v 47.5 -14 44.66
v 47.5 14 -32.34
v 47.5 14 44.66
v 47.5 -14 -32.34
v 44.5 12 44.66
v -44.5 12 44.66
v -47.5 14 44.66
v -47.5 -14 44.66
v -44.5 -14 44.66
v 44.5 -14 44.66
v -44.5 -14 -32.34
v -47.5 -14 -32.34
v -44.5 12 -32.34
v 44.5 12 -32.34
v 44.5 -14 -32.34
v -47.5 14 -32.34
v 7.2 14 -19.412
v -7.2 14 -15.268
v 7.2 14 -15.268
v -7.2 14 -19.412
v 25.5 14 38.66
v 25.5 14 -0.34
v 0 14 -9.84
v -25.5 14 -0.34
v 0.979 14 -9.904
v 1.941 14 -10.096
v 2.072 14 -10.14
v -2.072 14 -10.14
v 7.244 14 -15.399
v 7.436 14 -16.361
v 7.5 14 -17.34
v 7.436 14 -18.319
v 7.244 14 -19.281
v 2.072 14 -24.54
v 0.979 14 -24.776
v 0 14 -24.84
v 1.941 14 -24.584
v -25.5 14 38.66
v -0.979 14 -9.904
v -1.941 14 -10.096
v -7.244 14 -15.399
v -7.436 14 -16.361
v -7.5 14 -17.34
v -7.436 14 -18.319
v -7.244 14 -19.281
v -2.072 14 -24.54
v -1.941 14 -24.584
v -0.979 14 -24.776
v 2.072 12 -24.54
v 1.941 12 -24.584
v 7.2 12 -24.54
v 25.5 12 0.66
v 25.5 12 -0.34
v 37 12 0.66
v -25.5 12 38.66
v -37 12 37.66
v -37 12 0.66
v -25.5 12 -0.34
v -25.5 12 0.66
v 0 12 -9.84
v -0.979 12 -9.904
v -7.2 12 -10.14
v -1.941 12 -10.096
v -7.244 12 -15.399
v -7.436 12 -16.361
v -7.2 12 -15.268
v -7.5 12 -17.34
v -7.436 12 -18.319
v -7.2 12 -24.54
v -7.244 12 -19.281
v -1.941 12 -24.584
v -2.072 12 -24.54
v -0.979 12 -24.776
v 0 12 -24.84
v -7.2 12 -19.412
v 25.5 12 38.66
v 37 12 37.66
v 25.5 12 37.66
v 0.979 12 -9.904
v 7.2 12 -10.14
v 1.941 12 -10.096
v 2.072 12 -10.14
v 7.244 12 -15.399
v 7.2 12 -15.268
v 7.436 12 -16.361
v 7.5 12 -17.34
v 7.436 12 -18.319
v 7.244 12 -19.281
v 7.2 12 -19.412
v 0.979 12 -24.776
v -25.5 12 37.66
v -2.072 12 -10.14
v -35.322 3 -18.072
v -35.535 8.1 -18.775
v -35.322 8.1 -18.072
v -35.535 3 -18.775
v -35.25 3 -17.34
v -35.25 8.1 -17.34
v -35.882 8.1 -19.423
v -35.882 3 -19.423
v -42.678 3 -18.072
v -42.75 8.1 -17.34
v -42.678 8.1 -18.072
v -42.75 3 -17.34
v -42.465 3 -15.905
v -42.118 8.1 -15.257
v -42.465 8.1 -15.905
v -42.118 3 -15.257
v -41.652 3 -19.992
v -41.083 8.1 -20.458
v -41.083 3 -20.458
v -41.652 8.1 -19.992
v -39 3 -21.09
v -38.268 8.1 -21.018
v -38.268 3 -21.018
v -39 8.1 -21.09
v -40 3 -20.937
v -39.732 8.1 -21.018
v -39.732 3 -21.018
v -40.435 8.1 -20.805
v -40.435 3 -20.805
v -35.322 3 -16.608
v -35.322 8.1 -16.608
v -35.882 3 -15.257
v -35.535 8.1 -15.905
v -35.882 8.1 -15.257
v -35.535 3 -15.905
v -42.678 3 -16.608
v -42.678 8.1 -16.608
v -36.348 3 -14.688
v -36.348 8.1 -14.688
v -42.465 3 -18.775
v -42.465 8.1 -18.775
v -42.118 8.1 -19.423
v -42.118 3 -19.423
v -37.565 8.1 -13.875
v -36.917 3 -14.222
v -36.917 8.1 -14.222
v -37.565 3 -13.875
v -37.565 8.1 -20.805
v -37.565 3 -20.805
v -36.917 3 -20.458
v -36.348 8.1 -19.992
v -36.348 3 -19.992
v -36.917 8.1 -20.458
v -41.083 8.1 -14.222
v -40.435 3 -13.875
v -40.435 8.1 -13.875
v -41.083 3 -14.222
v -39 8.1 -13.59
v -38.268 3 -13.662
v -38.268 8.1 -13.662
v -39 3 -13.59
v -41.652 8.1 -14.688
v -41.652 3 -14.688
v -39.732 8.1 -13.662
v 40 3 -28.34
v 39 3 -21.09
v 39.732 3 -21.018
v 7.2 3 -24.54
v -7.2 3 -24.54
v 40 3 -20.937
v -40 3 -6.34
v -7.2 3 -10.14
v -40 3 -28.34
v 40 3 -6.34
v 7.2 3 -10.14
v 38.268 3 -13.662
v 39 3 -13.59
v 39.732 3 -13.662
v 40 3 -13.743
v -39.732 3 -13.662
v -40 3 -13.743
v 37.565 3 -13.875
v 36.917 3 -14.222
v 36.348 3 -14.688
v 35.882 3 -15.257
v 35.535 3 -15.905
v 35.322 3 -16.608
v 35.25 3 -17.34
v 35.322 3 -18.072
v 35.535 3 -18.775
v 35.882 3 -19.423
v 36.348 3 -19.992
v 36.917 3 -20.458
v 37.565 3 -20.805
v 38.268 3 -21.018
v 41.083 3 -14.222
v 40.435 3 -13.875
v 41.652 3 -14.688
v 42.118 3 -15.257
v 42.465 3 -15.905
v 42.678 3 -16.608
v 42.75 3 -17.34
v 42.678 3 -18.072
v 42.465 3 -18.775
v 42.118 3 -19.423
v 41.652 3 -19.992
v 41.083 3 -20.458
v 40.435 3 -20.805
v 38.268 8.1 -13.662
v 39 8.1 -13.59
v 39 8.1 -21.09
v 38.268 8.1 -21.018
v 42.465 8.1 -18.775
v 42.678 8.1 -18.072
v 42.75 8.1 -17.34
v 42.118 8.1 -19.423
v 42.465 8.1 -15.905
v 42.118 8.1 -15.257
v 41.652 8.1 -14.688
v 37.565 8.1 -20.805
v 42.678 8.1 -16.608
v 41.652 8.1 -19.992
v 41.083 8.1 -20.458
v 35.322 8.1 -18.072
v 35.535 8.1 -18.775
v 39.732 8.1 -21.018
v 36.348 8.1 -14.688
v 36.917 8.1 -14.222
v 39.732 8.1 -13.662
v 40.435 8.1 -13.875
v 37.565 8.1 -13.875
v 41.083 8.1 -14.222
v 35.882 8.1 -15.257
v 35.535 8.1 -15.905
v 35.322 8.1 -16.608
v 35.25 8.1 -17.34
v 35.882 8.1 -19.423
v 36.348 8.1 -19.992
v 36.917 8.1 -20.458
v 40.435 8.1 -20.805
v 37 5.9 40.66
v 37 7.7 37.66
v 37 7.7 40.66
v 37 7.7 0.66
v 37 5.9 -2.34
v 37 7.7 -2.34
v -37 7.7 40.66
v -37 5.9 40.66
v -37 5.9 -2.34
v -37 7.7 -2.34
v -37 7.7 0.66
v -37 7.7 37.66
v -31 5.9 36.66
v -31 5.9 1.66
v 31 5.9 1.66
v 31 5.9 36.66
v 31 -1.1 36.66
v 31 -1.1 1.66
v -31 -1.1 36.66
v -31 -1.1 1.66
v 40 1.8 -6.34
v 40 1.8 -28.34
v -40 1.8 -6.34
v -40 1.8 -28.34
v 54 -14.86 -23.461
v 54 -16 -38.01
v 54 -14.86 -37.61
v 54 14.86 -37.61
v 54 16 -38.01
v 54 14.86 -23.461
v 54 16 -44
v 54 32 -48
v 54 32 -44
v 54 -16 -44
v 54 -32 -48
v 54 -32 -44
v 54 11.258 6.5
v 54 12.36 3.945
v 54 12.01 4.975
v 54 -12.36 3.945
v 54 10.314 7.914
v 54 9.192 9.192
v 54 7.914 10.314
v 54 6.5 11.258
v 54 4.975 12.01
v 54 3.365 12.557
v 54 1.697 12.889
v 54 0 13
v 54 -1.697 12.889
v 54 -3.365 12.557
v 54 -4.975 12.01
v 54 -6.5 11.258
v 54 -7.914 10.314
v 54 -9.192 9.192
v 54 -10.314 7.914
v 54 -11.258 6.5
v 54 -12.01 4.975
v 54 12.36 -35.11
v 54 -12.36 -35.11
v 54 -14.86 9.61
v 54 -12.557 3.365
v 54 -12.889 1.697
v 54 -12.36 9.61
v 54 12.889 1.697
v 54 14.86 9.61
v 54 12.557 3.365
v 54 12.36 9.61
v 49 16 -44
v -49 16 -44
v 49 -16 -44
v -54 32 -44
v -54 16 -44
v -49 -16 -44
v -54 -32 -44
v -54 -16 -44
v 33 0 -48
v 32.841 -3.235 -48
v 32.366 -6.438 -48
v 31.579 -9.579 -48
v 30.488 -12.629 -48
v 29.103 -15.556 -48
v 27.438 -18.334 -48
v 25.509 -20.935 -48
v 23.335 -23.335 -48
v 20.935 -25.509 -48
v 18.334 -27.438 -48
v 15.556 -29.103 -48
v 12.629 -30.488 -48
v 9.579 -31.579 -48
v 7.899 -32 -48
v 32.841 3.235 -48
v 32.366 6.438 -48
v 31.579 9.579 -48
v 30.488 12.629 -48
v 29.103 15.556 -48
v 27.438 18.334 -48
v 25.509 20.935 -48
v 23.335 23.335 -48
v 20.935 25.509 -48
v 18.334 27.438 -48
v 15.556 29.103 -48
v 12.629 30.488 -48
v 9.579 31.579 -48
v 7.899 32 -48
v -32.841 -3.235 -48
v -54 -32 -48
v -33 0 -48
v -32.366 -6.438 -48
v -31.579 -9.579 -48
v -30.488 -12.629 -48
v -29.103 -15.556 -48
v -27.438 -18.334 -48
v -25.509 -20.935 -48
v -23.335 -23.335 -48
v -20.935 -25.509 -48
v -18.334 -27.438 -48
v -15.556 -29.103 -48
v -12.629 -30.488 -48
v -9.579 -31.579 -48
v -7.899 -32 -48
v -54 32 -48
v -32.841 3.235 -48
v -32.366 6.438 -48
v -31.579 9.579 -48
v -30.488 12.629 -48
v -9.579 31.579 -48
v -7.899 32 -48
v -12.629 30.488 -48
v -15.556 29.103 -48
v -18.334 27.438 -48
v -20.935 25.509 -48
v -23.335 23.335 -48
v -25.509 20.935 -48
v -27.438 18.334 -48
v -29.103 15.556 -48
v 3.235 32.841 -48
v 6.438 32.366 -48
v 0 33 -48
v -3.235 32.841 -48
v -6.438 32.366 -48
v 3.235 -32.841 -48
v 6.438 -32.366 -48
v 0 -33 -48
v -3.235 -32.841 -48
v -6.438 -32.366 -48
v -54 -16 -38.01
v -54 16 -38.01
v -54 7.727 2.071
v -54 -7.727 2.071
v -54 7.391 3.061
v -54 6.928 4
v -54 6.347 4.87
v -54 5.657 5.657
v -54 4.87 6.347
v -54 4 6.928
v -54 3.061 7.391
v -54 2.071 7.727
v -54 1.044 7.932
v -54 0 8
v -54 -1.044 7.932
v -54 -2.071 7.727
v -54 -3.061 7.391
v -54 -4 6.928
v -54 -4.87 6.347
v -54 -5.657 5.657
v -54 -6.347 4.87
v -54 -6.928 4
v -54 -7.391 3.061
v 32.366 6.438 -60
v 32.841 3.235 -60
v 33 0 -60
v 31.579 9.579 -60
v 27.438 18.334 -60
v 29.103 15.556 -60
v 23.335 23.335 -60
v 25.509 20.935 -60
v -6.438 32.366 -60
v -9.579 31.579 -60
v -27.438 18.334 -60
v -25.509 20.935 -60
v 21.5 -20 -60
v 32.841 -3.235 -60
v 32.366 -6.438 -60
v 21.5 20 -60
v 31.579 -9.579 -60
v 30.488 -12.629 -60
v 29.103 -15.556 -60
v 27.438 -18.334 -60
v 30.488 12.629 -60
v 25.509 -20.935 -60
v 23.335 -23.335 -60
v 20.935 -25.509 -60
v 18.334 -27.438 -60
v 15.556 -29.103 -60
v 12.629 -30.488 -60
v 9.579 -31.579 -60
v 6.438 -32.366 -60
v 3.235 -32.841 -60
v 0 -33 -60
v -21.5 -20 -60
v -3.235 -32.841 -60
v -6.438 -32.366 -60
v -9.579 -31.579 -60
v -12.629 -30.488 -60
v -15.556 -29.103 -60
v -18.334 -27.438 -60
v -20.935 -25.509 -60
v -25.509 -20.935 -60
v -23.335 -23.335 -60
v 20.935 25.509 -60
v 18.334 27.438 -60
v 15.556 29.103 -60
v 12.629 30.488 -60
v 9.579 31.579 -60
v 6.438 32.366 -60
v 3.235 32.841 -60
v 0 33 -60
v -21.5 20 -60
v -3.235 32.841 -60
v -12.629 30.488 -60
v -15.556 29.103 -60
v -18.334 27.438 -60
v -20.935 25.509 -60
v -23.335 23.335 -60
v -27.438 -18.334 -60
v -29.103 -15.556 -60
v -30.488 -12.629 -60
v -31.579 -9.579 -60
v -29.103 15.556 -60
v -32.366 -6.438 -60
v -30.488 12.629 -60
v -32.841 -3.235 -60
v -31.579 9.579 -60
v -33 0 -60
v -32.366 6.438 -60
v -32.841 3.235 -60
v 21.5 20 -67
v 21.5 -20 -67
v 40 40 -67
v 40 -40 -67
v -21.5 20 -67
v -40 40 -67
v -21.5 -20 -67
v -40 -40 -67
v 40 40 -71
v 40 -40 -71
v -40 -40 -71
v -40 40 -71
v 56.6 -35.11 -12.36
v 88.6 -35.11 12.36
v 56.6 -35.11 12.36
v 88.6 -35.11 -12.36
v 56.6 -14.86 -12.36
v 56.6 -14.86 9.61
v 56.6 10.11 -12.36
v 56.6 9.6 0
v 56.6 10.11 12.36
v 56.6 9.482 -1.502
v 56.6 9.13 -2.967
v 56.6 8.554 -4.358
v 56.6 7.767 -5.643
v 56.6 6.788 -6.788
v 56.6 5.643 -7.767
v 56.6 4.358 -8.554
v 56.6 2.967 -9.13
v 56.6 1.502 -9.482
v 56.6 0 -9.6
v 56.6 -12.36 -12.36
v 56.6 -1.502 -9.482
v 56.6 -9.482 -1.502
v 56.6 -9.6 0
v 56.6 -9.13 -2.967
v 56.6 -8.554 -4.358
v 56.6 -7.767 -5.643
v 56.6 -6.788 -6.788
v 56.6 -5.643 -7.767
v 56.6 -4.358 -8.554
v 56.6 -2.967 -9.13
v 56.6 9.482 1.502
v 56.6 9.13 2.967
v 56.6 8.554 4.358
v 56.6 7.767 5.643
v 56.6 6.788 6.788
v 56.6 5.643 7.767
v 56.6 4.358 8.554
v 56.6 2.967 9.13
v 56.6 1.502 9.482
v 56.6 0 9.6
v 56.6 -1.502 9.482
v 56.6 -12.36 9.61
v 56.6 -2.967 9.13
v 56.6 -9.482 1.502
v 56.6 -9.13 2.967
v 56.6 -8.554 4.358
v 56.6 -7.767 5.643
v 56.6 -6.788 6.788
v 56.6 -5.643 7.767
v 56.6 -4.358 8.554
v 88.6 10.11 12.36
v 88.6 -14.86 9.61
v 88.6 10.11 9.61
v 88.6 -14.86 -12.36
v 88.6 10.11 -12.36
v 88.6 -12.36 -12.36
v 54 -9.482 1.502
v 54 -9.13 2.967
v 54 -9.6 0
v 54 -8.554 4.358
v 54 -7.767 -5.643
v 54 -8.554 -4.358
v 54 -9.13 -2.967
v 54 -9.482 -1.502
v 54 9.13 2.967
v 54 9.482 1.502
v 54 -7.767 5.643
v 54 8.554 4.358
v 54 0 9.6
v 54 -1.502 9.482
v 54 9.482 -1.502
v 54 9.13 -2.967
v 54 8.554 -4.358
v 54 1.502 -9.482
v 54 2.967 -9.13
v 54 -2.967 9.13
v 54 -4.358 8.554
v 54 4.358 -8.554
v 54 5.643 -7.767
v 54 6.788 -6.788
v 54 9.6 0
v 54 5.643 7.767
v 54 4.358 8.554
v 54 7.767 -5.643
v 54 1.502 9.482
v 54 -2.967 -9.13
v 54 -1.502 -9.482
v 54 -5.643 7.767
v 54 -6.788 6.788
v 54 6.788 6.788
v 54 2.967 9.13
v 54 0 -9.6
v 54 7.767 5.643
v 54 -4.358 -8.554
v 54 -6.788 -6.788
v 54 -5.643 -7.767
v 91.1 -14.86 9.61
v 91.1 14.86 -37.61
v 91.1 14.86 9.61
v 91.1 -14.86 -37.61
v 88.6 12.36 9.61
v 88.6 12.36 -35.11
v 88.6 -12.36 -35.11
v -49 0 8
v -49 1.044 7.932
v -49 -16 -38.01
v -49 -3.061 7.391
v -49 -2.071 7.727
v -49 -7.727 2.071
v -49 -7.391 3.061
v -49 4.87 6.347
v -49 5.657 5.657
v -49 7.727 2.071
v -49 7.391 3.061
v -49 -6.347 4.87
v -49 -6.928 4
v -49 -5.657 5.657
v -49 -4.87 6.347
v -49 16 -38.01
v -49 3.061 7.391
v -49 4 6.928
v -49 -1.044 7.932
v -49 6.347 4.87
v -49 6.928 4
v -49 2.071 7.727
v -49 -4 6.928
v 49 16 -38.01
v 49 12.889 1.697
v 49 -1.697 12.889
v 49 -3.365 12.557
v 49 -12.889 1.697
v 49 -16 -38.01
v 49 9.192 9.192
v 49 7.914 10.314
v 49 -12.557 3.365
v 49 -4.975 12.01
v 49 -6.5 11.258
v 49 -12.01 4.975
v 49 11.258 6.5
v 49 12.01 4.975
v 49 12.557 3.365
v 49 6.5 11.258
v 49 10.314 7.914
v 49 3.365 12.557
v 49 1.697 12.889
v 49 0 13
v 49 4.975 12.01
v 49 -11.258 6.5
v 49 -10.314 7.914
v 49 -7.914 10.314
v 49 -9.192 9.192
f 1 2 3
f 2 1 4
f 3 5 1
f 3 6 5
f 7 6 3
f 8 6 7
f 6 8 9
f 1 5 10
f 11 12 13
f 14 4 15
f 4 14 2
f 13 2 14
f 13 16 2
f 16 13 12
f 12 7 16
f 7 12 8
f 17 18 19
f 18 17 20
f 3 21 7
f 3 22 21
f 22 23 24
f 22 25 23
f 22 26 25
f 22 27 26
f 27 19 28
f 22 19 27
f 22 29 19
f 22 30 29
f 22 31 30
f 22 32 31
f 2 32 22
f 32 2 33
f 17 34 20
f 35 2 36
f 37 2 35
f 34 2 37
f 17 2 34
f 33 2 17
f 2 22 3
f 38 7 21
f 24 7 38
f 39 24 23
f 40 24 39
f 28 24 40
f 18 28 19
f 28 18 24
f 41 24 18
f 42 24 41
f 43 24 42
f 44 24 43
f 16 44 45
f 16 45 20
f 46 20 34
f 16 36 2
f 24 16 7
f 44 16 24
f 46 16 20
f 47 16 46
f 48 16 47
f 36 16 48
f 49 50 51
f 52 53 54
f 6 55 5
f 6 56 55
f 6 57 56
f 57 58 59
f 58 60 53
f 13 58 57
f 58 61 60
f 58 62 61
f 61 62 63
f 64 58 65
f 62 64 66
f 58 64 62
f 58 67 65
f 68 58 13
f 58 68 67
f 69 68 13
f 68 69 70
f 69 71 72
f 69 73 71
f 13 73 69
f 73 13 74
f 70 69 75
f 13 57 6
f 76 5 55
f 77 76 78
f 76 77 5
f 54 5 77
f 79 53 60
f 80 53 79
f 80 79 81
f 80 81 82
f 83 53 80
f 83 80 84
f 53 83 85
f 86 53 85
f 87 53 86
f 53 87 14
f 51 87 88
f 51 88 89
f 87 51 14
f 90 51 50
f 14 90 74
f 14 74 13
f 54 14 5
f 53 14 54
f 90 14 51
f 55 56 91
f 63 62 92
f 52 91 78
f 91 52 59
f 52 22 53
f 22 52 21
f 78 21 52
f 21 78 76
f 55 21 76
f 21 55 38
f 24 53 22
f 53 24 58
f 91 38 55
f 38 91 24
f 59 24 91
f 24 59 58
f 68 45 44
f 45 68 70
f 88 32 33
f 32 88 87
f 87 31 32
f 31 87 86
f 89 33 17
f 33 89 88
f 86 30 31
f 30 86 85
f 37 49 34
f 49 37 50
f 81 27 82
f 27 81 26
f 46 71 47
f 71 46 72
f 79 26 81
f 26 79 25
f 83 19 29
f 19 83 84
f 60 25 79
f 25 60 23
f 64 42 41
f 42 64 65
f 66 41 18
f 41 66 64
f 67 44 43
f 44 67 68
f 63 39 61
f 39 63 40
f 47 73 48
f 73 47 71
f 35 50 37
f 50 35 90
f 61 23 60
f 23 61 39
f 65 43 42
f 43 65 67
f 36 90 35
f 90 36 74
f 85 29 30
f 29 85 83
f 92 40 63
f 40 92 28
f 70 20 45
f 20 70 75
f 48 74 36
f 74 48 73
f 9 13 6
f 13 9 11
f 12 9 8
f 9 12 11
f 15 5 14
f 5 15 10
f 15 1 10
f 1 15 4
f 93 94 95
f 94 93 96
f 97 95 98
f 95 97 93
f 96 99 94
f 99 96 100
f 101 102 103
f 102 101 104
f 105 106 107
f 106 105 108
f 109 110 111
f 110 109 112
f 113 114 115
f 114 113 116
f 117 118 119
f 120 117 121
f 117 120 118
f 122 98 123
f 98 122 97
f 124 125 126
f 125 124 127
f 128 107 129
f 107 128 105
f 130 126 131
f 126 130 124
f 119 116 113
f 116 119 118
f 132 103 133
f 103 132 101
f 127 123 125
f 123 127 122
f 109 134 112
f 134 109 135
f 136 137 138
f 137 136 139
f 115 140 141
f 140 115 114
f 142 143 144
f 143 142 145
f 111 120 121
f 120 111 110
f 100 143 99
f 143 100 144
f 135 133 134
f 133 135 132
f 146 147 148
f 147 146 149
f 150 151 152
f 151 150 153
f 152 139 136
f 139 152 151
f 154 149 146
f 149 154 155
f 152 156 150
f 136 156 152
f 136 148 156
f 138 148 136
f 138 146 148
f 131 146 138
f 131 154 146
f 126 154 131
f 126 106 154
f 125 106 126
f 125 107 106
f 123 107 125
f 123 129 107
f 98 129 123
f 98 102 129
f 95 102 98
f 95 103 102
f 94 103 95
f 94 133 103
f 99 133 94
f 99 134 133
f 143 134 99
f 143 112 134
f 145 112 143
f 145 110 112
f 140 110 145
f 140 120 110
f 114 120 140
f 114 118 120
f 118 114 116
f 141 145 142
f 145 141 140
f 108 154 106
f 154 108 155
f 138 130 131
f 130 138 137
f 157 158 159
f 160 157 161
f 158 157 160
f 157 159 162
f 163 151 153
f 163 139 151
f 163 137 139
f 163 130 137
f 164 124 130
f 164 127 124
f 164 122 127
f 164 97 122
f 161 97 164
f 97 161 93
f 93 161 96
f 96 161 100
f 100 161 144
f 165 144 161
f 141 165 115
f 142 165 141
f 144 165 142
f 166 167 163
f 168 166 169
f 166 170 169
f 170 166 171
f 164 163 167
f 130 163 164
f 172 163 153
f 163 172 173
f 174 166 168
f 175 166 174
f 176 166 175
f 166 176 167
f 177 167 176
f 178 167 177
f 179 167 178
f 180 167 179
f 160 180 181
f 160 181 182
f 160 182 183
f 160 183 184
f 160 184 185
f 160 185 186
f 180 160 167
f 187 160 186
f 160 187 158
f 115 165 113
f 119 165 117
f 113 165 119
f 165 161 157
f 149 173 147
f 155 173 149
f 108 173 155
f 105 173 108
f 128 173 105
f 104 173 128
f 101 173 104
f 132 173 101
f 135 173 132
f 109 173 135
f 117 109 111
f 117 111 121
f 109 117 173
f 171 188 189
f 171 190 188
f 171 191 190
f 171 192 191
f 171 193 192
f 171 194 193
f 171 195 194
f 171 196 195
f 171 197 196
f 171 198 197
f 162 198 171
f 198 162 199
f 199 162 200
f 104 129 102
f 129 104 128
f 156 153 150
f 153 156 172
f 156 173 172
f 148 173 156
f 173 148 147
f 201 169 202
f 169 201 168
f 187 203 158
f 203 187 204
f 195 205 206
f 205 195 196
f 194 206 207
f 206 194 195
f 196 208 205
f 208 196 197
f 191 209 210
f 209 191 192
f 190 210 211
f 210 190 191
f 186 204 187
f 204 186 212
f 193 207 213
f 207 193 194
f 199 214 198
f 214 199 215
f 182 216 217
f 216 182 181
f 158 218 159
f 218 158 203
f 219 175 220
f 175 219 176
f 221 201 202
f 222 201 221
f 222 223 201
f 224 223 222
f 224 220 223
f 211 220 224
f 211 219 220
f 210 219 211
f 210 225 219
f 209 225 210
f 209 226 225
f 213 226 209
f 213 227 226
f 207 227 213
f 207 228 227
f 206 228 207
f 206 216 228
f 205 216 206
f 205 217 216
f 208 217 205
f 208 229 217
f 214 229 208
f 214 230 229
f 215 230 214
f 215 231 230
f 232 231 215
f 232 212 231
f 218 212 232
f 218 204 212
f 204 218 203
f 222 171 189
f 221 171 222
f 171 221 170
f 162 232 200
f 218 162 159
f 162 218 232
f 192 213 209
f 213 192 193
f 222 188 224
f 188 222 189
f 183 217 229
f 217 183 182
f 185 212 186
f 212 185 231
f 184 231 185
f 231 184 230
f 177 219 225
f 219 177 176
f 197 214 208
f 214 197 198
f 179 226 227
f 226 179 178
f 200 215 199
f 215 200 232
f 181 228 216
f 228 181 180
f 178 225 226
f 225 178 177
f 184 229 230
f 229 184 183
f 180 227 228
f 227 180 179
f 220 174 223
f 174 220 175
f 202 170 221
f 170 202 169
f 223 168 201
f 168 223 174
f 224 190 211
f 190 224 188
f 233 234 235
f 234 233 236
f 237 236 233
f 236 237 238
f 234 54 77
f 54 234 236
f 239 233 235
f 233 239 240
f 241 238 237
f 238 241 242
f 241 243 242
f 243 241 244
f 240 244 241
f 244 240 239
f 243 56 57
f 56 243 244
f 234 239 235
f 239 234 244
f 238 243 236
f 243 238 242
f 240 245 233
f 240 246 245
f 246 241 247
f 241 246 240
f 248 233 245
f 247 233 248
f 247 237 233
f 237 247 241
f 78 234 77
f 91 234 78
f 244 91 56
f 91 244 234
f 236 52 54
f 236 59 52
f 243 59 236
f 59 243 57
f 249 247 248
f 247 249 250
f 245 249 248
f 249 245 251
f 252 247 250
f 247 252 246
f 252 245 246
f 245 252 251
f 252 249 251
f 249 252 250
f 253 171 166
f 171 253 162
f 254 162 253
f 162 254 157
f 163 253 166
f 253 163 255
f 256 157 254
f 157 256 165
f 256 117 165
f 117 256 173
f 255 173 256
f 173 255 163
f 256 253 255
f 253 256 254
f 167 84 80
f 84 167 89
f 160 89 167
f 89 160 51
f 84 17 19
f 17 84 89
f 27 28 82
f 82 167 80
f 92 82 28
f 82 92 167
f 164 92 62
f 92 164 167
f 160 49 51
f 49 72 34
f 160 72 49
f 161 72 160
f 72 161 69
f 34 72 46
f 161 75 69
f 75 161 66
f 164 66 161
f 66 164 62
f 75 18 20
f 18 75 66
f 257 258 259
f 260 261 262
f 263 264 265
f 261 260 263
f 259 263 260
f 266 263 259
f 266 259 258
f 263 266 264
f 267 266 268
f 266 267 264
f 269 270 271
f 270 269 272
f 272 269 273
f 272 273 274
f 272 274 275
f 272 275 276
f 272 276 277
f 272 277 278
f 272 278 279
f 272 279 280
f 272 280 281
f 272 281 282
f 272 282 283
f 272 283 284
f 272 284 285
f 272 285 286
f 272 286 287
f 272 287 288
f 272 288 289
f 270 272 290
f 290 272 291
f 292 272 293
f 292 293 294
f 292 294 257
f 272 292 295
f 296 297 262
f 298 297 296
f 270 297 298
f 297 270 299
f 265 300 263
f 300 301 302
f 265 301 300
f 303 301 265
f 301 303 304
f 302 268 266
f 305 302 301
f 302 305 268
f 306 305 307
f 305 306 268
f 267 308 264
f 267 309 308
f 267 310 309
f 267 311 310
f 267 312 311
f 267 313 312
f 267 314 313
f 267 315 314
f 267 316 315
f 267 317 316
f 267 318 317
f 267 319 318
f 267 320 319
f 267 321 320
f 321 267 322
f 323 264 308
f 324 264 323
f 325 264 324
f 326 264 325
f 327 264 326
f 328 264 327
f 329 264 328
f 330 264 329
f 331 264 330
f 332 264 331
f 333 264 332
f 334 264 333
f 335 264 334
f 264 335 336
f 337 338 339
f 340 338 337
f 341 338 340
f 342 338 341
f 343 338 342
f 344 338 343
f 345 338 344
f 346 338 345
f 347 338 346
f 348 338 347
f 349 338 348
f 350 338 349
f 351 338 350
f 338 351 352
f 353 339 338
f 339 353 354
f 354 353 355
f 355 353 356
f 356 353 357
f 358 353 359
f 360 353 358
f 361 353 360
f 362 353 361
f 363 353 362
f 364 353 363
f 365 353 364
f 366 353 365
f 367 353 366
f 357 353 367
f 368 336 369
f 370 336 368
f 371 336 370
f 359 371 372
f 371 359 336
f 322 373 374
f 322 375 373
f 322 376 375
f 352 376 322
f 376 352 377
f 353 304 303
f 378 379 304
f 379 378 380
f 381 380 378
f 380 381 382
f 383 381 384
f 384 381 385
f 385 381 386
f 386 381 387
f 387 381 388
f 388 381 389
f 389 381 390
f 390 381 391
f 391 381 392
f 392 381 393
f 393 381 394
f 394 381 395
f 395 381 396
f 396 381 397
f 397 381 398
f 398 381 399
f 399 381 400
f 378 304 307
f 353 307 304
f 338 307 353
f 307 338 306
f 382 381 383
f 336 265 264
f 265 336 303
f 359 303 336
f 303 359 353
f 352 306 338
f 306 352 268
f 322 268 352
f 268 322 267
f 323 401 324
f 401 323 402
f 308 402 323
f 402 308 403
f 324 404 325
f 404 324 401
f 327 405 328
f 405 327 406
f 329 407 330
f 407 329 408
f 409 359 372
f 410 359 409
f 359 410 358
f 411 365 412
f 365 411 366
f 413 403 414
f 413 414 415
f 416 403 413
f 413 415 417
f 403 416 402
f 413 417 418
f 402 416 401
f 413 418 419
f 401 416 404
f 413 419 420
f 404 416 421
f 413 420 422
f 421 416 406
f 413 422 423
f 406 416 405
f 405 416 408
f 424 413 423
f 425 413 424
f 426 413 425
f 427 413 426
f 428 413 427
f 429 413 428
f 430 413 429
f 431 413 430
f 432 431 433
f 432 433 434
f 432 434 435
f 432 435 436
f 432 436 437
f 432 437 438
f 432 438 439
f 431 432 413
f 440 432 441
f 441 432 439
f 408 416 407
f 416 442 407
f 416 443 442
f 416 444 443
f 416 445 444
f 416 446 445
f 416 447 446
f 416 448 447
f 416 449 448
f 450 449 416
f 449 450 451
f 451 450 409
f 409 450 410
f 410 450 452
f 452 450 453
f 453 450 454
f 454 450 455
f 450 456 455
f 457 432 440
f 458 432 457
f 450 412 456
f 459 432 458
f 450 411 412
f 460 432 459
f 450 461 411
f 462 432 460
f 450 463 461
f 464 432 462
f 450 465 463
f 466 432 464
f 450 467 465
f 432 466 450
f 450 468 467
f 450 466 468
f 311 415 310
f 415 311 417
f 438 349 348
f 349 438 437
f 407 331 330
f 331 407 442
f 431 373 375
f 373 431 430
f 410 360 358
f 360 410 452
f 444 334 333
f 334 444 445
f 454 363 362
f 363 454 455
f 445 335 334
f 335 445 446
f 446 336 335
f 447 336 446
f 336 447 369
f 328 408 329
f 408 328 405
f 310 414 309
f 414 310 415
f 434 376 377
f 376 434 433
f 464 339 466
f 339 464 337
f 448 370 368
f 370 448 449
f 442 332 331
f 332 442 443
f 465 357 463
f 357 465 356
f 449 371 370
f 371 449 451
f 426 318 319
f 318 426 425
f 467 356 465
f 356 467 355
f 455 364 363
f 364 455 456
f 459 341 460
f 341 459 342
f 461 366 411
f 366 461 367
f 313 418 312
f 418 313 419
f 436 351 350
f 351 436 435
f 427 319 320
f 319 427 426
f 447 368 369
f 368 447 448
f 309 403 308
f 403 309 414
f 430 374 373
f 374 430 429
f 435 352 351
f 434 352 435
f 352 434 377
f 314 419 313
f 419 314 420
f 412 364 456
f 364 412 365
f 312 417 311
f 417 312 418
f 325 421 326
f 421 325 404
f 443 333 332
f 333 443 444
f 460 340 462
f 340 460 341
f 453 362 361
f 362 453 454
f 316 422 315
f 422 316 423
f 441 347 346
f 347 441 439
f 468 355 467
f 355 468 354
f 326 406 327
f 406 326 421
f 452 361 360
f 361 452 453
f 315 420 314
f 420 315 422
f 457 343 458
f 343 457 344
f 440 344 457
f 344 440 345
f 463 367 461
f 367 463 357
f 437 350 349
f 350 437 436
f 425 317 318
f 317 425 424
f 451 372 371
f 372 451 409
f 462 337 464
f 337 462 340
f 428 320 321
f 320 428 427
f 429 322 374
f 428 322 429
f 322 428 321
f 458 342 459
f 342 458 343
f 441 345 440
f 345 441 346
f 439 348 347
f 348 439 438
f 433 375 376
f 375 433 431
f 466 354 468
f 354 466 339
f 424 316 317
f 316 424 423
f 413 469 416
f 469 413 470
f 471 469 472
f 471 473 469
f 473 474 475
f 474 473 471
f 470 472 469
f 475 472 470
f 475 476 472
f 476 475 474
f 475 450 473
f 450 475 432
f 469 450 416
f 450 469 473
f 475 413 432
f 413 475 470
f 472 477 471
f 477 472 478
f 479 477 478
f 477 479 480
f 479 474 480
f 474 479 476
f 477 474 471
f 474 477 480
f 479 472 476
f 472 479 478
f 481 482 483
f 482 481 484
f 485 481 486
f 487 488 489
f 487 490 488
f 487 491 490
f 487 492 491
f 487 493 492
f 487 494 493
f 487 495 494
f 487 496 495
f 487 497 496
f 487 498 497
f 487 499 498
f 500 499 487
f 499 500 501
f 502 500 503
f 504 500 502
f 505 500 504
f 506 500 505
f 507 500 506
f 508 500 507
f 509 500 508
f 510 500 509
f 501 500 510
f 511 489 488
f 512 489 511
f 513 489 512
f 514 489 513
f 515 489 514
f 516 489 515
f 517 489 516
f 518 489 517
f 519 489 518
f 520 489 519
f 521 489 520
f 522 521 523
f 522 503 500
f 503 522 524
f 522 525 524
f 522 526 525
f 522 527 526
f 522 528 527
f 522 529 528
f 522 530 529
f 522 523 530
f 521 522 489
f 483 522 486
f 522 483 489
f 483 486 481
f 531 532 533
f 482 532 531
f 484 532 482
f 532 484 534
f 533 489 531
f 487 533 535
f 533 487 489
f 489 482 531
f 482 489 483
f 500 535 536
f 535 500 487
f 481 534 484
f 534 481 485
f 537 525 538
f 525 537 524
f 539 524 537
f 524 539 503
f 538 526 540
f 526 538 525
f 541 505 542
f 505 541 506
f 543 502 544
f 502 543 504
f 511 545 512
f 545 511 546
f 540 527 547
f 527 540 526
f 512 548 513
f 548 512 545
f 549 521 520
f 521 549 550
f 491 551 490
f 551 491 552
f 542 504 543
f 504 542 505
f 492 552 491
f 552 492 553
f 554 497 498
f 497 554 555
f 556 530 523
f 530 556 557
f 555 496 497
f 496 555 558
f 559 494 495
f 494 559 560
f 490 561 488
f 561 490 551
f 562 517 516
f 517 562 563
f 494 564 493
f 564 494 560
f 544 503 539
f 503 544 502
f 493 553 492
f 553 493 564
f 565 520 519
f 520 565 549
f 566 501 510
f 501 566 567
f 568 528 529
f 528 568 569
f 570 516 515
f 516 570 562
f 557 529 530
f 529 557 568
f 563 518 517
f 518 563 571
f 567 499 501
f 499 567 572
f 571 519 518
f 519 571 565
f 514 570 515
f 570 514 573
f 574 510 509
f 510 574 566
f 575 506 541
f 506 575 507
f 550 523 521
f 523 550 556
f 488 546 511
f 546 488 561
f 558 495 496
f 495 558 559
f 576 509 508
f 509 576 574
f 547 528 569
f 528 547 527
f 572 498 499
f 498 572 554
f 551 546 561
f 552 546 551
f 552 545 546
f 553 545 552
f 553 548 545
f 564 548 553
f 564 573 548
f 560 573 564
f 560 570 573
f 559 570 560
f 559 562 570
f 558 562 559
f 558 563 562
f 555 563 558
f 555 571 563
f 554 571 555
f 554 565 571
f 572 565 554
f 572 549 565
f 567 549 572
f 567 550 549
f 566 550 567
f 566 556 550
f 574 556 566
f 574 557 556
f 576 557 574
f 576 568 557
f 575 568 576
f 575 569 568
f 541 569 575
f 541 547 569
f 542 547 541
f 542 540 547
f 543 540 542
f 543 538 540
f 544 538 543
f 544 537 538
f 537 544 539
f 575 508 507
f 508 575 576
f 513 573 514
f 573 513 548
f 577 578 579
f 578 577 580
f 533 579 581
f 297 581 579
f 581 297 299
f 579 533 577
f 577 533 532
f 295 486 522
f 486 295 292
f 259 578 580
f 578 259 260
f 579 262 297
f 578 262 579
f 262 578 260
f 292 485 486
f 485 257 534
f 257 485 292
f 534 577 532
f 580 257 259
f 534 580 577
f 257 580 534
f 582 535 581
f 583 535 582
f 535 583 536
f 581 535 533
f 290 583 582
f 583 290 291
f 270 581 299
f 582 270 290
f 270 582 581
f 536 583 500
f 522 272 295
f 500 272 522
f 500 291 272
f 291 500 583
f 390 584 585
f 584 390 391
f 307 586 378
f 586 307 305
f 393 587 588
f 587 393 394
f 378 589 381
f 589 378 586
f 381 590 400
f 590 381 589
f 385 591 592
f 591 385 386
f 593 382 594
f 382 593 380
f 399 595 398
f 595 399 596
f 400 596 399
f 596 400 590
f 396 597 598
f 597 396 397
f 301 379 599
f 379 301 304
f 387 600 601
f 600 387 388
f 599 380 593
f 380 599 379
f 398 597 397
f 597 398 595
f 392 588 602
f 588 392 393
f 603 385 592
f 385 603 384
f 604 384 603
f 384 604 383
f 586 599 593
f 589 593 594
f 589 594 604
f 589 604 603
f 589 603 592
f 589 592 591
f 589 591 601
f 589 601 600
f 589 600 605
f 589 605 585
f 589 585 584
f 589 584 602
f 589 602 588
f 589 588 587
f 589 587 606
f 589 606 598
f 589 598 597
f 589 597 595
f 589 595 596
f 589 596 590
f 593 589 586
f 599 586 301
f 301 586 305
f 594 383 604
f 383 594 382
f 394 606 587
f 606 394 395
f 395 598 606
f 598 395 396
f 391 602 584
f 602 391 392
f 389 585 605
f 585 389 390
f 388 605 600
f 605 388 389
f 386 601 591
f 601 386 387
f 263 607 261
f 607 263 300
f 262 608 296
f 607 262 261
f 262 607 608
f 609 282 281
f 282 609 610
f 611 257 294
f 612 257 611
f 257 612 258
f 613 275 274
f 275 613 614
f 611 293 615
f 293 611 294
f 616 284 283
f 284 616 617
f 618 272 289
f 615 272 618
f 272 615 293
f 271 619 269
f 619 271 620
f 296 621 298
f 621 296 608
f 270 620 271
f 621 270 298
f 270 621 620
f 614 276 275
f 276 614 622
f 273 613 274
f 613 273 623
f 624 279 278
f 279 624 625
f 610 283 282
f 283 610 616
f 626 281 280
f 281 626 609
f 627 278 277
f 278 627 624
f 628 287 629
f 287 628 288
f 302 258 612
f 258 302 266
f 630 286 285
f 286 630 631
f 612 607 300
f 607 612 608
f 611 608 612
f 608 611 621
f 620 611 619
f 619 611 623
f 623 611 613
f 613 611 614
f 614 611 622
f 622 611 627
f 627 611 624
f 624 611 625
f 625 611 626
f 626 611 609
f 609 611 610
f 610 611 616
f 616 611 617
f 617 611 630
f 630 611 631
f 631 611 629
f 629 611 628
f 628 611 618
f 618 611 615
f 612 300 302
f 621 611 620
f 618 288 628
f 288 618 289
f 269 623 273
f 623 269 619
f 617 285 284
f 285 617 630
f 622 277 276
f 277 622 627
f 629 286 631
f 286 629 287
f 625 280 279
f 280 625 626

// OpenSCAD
// file: cyd_head_concept.scad
// Concept: the real head = a Guition ESP32-2432S024 (2.4" CYD) for the eyes + the bare C920 board below
// it, in a compact open frame on a yoke - the tilt axle through the head's middle so it's balanced.
// Proportions only (blocks), to agree the layout before the real parts.
//
// Frame: tilt axle along X at the origin, +Y forward, +Z up. tilt = head angle (deg, + = up).
include <../params.scad>

tilt = 0;

// ---- CYD ESP32-2432S024 (MEASURED 2026-10-21; landscape, USB-C at one end) -----------------------------
cyd_b     = [74, 43, 1.8];        // board: long (X), short (Z), thickness
cyd_holes = [68, 36];             // 4 x 3 mm holes, centres
cyd_glass = 4.3;                  // board front -> glass front
cyd_back  = 7;                    // EST: tallest back parts (JST, USB-C, ESP32 module) - TO MEASURE
cyd_act   = [49, 37];             // 2.4" 320x240 active area (nominal)
// ---- C920 bare board (MEASURED) -------------------------------------------------------------------------
cam_b     = [80, 22, 1.2];
cam_lens  = [14.4, 11];           // lens block side, height above the board
cam_mic   = [7.5, 5.1];

face_t    = 2;                    // front plate
gap       = 4;                    // between the screen's board and the camera board
margin    = 4;
head_w    = max(cyd_b[0], cam_b[0] + 7) + 2 * margin;            // mics overhang the camera board ~3.5
head_h    = cyd_b[1] + gap + cam_b[1] + 2 * margin;
y_face    = 14;                   // front face of the plate (forward of the axle)
z_bot     = -head_h * 0.42;       // axle about 42 % up from the bottom (the screen is the heavier part)

z_cam     = z_bot + margin;                         // camera board bottom
z_cyd     = z_cam + cam_b[1] + gap;                 // screen board bottom
y_cyd     = y_face - face_t - cyd_glass;            // screen board front (glass flush behind the plate)
y_cam     = y_face - cam_lens[1];                   // camera board front (lens ~flush with the face)

cheek_gap = 1.5;                  // washer
cheek_t   = 5;

module head() {
    // front plate with the two windows
    color("#d9d9d9") difference() {
        translate([-head_w / 2, y_face - face_t, z_bot]) cube([head_w, face_t, head_h]);
        translate([-cyd_act[0] / 2 - 1, y_face - 3, z_cyd + cyd_b[1] / 2 - cyd_act[1] / 2 - 1]) cube([cyd_act[0] + 2, 4, cyd_act[1] + 2]);
        translate([0, y_face - 3, z_cam + cam_b[1] / 2]) rotate([-90, 0, 0]) cylinder(d = 15, h = 4, $fn = 48);
    }
    // side frames (where the axle goes)
    color("#d9d9d9") for (s = [-1, 1]) translate([s > 0 ? head_w / 2 - 3 : -head_w / 2, -14, z_bot]) cube([3, y_face - face_t + 14, head_h]);
    // the screen
    color("#c98d1a") translate([-cyd_b[0] / 2, y_cyd - cyd_b[2], z_cyd]) cube([cyd_b[0], cyd_b[2], cyd_b[1]]);
    color("#111") translate([-cyd_b[0] / 2, y_cyd, z_cyd + 3]) cube([cyd_b[0], cyd_glass, cyd_b[1] - 6]);
    color("#777") translate([-cyd_b[0] / 2 + 6, y_cyd - cyd_b[2] - cyd_back, z_cyd + 4]) cube([cyd_b[0] - 12, cyd_back, cyd_b[1] - 8]);
    // the camera
    color("#2e7d32") translate([-cam_b[0] / 2, y_cam - cam_b[2], z_cam]) cube([cam_b[0], cam_b[2], cam_b[1]]);
    color("#111") translate([-cam_lens[0] / 2, y_cam, z_cam + cam_b[1] / 2 - cam_lens[0] / 2]) cube([cam_lens[0], cam_lens[1], cam_lens[0]]);
    color("#999") for (s = [-1, 1]) translate([s * (cam_b[0] / 2 - 1), y_cam, z_cam + cam_b[1] / 2]) rotate([-90, 0, 0])
        cylinder(d = cam_mic[0], h = cam_mic[1], $fn = 32);
}

module yoke() {   // the cheeks only, to show the width; the turret below is the test stand's, redrawn later
    color("#555") for (s = [-1, 1]) {
        x0 = s > 0 ? head_w / 2 + cheek_gap : -head_w / 2 - cheek_gap - cheek_t;
        hull() {
            translate([x0, 0, 0]) rotate([0, 90, 0]) cylinder(d = 16, h = cheek_t, $fn = 48);
            translate([x0, -12, -70]) cube([cheek_t, 24, 6]);
        }
    }
    color("#e8a33d") for (s = [-1, 1]) translate([s * (head_w / 2 - 4), 0, 0]) rotate([0, 90, 0]) cylinder(d = 4, h = 12, center = true, $fn = 16);
}

rotate([tilt, 0, 0]) head();
yoke();
echo(str("head ", head_w, " W x ", head_h, " H; yoke outside ", head_w + 2 * (cheek_gap + cheek_t), "; lens ",
         z_cam + cam_b[1] / 2, " / screen centre ", z_cyd + cyd_b[1] / 2, " from the axle"));
// main file
// Rough look at the two tilt drives for the CYD head (blocks, not parts):
//   opt = "A"  direct drive: the tilt servo stands on the outside of the right cheek, its horn on the head
//   opt = "B"  linkage: the tilt servo lies low in the turret; a link runs up behind the head to a crank
// Frame: tilt axle along X at the origin, +Y forward, +Z up. tilt = head angle (deg, + = up).
use <cyd_head_concept.scad>
include <../params.scad>

opt  = "A";
tilt = 0;

head_w = 95;  head_h = 77;  z_hbot = -32.3;      // from cyd_head_concept.scad
gap  = 1.5;   cht = 5;                           // cheek gap + thickness
xc   = head_w / 2 + gap;                         // cheeks' inner faces
srv  = sts_body;                                 // 45.22 x 24.72 x 32

z_floor = opt == "A" ? -44 : -64;                // turret floor top
floor_t = 4;

module servo_blk() {                             // shaft along +Z at the origin, body below, length along +X
    color("#1d3557") translate([-sts_shaft_x, -srv[1] / 2, -srv[2]]) cube(srv);
    color("#c0c0c0") cylinder(d = sts_horn_d, h = sts_horn_h, $fn = 40);
}

module turret_floor() {
    color("#555") translate([-(xc + cht), -32, z_floor - floor_t]) cube([2 * (xc + cht), 64, floor_t]);
    color("#e8a33d") translate([0, 0, z_floor - floor_t - 12]) cylinder(d = 66, h = 12, $fn = 64);    // hub flange
    color("#b0b6bd") translate([-21.5, -20, z_floor - floor_t - 12 - 7]) cube([43, 40, 7]);          // pillow block
    color("#9aa3ad") translate([-40, -40, z_floor - floor_t - 12 - 7 - 4]) cube([80, 80, 4]);        // base plate
}

module cheek(s, top_d = 16) {
    x0 = s > 0 ? xc : -xc - cht;
    color("#555") hull() {
        translate([x0, 0, 0]) rotate([0, 90, 0]) cylinder(d = top_d, h = cht, $fn = 48);
        translate([x0, -16, z_floor - 0.01]) cube([cht, 32, 6]);
    }
}

if (opt == "A") {
    rotate([tilt, 0, 0]) head();
    turret_floor();
    cheek(-1);
    cheek(1, 26);                                                                    // wider round the horn
    // the servo: shaft along -X on the axle, body standing down the outside of the right cheek
    translate([xc + cht + sts_horn_h, 0, 0]) rotate([0, -90, 0]) rotate([0, 0, -90]) servo_blk();
    // its cradle: a box round the body, on the cheek
    color("#777", 0.6) translate([xc + cht, -srv[1] / 2 - 2.5, -srv[0] + sts_shaft_x - 2.5])
        difference() { cube([srv[2] + sts_horn_h + 2.5, srv[1] + 5, srv[0] + 2]); translate([-1, 2.5, 2.5]) cube([srv[2] + sts_horn_h + 1, srv[1], srv[0]]); }
}
if (opt == "B") {
    rotate([tilt, 0, 0]) head();
    turret_floor();
    cheek(-1); cheek(1);
    // tilt servo lying under the head, shaft along +X, its disc at the right; arm and crank both 15 mm
    // pointing BACK (equal arms + link parallel to the pivots' line = head angle equals servo angle)
    z_s = z_floor + srv[1] / 2;
    x_d = head_w / 2 - 6;
    translate([x_d - sts_horn_h - srv[2], 0, z_s]) rotate([0, 90, 0]) rotate([0, 0, 90]) translate([0, 0, srv[2]]) servo_blk();
    color("#c55") translate([x_d, 0, z_s]) rotate([0, 90, 0]) cylinder(d = 32, h = 4, $fn = 48);              // disc
    arm = 15;
    A = [-arm * cos(tilt), z_s - arm * sin(tilt)];   B = [-arm * cos(tilt), -arm * sin(tilt)];
    color("#d4a017") hull() for (p = [A, B]) translate([x_d + 6, p[0], p[1]]) sphere(d = 4, $fn = 16);      // link
    color("#d4a017") hull() { translate([x_d + 6, 0, 0]) rotate([0, 90, 0]) cylinder(d = 8, h = 3, $fn = 24);   // crank
                              translate([x_d + 6, B[0], B[1]]) rotate([0, 90, 0]) cylinder(d = 7, h = 3, $fn = 24); }
}
